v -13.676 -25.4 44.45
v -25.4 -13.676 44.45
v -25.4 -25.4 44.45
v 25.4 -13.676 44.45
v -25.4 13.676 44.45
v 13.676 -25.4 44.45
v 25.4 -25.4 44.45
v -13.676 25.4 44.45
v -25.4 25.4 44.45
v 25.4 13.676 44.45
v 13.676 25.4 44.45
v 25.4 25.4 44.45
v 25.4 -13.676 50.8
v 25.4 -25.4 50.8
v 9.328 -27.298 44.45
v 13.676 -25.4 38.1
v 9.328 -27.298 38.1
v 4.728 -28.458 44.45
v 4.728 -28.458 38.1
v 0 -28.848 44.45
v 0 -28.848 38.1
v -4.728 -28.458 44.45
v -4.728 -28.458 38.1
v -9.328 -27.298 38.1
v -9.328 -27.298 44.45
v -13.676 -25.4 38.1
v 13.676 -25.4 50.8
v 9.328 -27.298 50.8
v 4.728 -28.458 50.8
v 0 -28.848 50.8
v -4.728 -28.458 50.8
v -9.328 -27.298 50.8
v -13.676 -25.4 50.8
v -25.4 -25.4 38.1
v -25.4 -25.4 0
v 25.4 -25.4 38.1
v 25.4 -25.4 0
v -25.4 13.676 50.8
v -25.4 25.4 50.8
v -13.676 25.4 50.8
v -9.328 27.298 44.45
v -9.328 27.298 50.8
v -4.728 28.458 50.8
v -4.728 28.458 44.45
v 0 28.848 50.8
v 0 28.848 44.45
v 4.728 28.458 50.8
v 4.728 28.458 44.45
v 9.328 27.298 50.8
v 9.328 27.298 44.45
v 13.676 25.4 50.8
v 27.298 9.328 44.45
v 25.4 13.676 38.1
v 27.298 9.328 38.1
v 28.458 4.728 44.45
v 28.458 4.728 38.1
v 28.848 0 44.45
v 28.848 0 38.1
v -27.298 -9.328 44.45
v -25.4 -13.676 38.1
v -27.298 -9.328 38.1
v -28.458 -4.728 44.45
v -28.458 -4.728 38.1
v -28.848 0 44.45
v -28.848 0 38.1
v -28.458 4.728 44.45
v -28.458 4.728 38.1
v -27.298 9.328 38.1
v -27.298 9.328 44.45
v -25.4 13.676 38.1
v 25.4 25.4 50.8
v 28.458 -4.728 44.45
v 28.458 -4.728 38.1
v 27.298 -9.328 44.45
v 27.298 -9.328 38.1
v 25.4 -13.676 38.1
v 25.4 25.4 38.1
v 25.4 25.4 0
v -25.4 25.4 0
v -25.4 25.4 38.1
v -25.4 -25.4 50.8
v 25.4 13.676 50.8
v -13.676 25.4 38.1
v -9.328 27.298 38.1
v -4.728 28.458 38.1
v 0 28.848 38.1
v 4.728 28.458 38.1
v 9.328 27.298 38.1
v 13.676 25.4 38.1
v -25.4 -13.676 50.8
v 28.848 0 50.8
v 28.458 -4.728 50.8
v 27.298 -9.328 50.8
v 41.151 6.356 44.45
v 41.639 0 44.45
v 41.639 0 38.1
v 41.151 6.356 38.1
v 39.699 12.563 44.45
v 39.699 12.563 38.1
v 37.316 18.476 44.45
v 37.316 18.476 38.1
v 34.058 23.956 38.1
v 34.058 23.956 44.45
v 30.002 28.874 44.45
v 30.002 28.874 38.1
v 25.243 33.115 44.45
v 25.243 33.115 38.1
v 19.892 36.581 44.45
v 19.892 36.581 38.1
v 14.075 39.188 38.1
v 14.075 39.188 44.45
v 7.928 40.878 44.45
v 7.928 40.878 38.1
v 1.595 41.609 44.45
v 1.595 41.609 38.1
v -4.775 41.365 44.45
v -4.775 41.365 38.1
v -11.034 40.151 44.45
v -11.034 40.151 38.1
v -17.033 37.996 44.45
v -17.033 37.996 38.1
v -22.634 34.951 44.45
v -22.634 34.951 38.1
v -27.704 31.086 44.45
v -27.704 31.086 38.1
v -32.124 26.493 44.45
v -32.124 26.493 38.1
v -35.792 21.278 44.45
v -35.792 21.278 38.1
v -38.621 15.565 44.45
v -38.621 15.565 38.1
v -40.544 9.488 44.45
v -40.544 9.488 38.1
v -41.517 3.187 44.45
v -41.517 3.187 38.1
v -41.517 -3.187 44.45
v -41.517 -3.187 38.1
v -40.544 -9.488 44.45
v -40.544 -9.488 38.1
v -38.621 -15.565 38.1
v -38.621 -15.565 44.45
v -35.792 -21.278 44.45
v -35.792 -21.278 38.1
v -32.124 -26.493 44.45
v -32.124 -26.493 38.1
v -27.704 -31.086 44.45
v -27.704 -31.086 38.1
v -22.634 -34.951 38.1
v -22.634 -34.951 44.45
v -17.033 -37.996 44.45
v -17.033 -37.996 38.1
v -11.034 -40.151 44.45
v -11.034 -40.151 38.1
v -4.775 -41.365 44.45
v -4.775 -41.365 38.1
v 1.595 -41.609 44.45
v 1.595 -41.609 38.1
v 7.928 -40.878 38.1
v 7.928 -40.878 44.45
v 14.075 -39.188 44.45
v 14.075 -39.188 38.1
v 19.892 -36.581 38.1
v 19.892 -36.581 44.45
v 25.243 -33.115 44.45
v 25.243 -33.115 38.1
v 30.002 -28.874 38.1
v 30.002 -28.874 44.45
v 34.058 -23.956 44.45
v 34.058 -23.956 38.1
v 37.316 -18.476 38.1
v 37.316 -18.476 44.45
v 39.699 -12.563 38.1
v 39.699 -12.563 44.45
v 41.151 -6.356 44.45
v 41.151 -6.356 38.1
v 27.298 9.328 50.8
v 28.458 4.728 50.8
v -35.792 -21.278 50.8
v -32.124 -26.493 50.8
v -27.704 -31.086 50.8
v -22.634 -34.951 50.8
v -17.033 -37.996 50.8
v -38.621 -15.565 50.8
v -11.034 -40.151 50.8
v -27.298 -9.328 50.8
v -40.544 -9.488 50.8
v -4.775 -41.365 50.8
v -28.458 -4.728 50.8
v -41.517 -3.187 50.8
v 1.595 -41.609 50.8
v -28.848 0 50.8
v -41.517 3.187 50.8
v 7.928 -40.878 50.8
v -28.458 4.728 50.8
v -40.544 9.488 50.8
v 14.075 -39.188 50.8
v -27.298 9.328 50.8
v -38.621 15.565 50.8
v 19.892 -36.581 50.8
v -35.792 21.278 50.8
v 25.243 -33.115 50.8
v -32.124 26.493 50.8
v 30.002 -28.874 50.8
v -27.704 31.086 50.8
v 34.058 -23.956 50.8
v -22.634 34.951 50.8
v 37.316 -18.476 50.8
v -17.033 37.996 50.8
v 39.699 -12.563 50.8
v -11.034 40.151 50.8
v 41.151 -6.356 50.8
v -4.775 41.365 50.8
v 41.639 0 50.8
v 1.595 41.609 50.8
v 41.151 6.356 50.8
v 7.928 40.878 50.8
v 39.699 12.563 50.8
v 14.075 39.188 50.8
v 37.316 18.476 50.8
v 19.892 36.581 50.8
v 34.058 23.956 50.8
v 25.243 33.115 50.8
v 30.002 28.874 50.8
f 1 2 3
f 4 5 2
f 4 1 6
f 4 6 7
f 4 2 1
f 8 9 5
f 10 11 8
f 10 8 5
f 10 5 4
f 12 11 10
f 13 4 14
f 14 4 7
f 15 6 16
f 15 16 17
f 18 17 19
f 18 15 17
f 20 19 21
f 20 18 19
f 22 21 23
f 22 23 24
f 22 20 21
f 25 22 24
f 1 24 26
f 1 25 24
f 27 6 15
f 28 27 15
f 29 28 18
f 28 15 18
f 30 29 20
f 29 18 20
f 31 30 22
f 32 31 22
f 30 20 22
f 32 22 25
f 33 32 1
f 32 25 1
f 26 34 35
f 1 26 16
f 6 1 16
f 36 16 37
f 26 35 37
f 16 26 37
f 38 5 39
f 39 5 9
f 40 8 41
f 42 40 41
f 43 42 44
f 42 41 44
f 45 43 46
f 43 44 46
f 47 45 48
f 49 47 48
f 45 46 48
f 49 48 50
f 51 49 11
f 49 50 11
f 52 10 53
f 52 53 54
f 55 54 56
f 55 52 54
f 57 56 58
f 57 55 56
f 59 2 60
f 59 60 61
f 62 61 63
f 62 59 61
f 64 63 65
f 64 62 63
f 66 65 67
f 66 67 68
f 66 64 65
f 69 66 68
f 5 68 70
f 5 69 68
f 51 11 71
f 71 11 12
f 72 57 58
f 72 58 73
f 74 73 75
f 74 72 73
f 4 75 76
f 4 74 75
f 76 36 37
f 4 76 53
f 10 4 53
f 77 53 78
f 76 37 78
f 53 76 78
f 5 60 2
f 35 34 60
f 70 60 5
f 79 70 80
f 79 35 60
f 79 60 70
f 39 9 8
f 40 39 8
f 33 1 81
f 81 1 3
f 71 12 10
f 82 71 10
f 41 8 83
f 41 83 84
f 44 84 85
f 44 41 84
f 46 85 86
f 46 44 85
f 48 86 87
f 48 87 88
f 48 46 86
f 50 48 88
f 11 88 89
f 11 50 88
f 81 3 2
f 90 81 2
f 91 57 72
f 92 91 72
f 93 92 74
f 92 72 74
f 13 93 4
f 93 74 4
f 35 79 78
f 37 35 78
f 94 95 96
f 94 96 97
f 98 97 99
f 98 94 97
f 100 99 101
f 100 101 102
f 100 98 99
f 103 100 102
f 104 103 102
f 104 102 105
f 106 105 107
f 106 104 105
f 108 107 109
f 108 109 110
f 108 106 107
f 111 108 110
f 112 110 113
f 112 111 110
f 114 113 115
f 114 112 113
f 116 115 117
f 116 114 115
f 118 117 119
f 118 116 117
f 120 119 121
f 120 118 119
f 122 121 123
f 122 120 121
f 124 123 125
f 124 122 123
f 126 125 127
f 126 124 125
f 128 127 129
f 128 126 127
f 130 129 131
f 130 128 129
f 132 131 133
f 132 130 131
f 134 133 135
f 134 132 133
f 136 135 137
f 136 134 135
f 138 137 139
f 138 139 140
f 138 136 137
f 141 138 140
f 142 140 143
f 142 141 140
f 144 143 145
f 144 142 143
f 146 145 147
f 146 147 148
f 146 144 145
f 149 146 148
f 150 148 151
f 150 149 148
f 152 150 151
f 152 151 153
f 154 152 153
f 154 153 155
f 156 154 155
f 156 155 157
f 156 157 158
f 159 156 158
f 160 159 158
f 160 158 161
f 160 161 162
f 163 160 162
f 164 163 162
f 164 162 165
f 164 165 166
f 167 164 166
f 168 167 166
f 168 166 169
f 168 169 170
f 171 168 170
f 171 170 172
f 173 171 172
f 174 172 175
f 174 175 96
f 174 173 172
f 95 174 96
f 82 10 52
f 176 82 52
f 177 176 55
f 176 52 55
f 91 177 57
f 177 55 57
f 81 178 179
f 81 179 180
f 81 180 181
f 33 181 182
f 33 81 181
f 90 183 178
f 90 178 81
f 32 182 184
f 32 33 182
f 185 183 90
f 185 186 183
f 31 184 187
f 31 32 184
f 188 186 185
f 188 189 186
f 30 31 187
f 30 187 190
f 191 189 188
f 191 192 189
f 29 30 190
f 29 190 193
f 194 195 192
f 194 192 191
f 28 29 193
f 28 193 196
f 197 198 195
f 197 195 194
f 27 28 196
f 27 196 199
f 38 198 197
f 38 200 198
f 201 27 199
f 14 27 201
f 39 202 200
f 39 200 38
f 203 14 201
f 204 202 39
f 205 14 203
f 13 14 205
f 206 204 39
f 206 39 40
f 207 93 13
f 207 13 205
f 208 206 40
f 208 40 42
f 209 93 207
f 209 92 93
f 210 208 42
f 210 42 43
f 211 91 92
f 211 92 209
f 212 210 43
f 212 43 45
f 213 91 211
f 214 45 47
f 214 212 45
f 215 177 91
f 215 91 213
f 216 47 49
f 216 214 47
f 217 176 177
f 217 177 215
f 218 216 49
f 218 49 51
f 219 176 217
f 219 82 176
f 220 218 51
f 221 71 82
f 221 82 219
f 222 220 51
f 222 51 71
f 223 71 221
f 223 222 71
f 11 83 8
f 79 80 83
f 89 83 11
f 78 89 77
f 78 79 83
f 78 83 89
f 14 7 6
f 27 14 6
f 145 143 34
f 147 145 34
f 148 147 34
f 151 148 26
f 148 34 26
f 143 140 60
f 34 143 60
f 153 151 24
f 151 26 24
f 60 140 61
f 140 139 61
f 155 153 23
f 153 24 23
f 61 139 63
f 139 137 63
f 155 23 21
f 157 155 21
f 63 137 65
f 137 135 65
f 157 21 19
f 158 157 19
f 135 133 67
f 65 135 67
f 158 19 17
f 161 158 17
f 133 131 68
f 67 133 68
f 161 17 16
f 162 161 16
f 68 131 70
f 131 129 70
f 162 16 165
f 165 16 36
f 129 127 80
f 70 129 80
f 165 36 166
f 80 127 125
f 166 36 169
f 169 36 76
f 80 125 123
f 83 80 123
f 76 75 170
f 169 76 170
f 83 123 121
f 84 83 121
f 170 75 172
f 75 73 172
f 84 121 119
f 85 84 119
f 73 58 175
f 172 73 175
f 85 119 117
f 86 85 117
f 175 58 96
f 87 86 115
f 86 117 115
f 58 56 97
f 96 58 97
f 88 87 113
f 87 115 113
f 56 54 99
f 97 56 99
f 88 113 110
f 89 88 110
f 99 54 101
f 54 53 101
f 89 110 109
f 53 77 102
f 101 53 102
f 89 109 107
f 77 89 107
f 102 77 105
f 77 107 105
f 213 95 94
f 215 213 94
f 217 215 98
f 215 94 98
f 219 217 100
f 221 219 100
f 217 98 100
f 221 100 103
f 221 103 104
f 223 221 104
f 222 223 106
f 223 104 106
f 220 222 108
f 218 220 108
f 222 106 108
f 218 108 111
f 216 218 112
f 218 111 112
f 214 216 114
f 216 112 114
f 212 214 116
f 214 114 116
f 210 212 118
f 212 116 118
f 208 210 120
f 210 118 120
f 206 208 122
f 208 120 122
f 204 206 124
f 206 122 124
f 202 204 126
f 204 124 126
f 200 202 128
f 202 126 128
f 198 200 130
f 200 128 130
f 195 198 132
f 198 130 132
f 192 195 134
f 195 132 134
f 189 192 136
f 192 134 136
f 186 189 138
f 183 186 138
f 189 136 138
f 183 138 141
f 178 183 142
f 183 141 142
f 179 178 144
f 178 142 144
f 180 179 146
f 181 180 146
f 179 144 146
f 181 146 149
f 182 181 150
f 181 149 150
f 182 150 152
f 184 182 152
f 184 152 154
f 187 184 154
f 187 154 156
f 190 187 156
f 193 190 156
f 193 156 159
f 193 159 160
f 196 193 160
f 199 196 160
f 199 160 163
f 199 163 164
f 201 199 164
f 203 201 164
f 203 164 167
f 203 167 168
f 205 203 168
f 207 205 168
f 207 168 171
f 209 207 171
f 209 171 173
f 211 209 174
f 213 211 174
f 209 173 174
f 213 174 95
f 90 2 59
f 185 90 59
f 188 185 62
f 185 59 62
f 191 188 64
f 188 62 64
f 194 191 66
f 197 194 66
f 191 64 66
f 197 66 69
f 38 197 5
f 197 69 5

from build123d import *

# Parameters (mm, degrees)
F0_W          = 50.8
F0_H          = 50.8
F1_DEPTH      = 44.45
F2_R          = 41.6392932994
F3_DEPTH      = 6.35
F3_DEPTH_BACK = 6.35


with BuildPart() as f1:
    # F0 (on Top) → F1 (new body)
    with BuildSketch(Plane.XY):
        Rectangle(F0_W, F0_H)
    extrude(amount=F1_DEPTH)

    # F2 (on face) → F3 (join, two sides)
    with BuildSketch(Plane.XY.offset(44.45)) as f3_sk:
        Circle(F2_R)
        with BuildLine():
            ThreePointArc((25.4, 13.6763064921), (27.9726476241, 7.0521162896), (28.8479004308, 0))
            ThreePointArc((28.8479004308, 0), (27.9726476241, -7.0521162896), (25.4, -13.6763064921))
            Line((25.4, -13.6763064921), (25.4, -25.4))
            Line((25.4, -25.4), (13.6763064921, -25.4))
            ThreePointArc((13.6763064921, -25.4), (0, -28.8479004308), (-13.6763064921, -25.4))
            Line((-13.6763064921, -25.4), (-25.4, -25.4))
            Line((-25.4, -25.4), (-25.4, -13.6763064921))
            ThreePointArc((-25.4, -13.6763064921), (-28.8479004308, 0), (-25.4, 13.6763064921))
            Line((-25.4, 13.6763064921), (-25.4, 25.4))
            Line((-25.4, 25.4), (-13.6763064921, 25.4))
            ThreePointArc((-13.6763064921, 25.4), (0, 28.8479004308), (13.6763064921, 25.4))
            Line((13.6763064921, 25.4), (25.4, 25.4))
            Line((25.4, 25.4), (25.4, 13.6763064921))
        make_face(mode=Mode.SUBTRACT)
    extrude(amount=-F3_DEPTH)
    extrude(f3_sk.sketch, amount=F3_DEPTH_BACK)


solid = f1.part
